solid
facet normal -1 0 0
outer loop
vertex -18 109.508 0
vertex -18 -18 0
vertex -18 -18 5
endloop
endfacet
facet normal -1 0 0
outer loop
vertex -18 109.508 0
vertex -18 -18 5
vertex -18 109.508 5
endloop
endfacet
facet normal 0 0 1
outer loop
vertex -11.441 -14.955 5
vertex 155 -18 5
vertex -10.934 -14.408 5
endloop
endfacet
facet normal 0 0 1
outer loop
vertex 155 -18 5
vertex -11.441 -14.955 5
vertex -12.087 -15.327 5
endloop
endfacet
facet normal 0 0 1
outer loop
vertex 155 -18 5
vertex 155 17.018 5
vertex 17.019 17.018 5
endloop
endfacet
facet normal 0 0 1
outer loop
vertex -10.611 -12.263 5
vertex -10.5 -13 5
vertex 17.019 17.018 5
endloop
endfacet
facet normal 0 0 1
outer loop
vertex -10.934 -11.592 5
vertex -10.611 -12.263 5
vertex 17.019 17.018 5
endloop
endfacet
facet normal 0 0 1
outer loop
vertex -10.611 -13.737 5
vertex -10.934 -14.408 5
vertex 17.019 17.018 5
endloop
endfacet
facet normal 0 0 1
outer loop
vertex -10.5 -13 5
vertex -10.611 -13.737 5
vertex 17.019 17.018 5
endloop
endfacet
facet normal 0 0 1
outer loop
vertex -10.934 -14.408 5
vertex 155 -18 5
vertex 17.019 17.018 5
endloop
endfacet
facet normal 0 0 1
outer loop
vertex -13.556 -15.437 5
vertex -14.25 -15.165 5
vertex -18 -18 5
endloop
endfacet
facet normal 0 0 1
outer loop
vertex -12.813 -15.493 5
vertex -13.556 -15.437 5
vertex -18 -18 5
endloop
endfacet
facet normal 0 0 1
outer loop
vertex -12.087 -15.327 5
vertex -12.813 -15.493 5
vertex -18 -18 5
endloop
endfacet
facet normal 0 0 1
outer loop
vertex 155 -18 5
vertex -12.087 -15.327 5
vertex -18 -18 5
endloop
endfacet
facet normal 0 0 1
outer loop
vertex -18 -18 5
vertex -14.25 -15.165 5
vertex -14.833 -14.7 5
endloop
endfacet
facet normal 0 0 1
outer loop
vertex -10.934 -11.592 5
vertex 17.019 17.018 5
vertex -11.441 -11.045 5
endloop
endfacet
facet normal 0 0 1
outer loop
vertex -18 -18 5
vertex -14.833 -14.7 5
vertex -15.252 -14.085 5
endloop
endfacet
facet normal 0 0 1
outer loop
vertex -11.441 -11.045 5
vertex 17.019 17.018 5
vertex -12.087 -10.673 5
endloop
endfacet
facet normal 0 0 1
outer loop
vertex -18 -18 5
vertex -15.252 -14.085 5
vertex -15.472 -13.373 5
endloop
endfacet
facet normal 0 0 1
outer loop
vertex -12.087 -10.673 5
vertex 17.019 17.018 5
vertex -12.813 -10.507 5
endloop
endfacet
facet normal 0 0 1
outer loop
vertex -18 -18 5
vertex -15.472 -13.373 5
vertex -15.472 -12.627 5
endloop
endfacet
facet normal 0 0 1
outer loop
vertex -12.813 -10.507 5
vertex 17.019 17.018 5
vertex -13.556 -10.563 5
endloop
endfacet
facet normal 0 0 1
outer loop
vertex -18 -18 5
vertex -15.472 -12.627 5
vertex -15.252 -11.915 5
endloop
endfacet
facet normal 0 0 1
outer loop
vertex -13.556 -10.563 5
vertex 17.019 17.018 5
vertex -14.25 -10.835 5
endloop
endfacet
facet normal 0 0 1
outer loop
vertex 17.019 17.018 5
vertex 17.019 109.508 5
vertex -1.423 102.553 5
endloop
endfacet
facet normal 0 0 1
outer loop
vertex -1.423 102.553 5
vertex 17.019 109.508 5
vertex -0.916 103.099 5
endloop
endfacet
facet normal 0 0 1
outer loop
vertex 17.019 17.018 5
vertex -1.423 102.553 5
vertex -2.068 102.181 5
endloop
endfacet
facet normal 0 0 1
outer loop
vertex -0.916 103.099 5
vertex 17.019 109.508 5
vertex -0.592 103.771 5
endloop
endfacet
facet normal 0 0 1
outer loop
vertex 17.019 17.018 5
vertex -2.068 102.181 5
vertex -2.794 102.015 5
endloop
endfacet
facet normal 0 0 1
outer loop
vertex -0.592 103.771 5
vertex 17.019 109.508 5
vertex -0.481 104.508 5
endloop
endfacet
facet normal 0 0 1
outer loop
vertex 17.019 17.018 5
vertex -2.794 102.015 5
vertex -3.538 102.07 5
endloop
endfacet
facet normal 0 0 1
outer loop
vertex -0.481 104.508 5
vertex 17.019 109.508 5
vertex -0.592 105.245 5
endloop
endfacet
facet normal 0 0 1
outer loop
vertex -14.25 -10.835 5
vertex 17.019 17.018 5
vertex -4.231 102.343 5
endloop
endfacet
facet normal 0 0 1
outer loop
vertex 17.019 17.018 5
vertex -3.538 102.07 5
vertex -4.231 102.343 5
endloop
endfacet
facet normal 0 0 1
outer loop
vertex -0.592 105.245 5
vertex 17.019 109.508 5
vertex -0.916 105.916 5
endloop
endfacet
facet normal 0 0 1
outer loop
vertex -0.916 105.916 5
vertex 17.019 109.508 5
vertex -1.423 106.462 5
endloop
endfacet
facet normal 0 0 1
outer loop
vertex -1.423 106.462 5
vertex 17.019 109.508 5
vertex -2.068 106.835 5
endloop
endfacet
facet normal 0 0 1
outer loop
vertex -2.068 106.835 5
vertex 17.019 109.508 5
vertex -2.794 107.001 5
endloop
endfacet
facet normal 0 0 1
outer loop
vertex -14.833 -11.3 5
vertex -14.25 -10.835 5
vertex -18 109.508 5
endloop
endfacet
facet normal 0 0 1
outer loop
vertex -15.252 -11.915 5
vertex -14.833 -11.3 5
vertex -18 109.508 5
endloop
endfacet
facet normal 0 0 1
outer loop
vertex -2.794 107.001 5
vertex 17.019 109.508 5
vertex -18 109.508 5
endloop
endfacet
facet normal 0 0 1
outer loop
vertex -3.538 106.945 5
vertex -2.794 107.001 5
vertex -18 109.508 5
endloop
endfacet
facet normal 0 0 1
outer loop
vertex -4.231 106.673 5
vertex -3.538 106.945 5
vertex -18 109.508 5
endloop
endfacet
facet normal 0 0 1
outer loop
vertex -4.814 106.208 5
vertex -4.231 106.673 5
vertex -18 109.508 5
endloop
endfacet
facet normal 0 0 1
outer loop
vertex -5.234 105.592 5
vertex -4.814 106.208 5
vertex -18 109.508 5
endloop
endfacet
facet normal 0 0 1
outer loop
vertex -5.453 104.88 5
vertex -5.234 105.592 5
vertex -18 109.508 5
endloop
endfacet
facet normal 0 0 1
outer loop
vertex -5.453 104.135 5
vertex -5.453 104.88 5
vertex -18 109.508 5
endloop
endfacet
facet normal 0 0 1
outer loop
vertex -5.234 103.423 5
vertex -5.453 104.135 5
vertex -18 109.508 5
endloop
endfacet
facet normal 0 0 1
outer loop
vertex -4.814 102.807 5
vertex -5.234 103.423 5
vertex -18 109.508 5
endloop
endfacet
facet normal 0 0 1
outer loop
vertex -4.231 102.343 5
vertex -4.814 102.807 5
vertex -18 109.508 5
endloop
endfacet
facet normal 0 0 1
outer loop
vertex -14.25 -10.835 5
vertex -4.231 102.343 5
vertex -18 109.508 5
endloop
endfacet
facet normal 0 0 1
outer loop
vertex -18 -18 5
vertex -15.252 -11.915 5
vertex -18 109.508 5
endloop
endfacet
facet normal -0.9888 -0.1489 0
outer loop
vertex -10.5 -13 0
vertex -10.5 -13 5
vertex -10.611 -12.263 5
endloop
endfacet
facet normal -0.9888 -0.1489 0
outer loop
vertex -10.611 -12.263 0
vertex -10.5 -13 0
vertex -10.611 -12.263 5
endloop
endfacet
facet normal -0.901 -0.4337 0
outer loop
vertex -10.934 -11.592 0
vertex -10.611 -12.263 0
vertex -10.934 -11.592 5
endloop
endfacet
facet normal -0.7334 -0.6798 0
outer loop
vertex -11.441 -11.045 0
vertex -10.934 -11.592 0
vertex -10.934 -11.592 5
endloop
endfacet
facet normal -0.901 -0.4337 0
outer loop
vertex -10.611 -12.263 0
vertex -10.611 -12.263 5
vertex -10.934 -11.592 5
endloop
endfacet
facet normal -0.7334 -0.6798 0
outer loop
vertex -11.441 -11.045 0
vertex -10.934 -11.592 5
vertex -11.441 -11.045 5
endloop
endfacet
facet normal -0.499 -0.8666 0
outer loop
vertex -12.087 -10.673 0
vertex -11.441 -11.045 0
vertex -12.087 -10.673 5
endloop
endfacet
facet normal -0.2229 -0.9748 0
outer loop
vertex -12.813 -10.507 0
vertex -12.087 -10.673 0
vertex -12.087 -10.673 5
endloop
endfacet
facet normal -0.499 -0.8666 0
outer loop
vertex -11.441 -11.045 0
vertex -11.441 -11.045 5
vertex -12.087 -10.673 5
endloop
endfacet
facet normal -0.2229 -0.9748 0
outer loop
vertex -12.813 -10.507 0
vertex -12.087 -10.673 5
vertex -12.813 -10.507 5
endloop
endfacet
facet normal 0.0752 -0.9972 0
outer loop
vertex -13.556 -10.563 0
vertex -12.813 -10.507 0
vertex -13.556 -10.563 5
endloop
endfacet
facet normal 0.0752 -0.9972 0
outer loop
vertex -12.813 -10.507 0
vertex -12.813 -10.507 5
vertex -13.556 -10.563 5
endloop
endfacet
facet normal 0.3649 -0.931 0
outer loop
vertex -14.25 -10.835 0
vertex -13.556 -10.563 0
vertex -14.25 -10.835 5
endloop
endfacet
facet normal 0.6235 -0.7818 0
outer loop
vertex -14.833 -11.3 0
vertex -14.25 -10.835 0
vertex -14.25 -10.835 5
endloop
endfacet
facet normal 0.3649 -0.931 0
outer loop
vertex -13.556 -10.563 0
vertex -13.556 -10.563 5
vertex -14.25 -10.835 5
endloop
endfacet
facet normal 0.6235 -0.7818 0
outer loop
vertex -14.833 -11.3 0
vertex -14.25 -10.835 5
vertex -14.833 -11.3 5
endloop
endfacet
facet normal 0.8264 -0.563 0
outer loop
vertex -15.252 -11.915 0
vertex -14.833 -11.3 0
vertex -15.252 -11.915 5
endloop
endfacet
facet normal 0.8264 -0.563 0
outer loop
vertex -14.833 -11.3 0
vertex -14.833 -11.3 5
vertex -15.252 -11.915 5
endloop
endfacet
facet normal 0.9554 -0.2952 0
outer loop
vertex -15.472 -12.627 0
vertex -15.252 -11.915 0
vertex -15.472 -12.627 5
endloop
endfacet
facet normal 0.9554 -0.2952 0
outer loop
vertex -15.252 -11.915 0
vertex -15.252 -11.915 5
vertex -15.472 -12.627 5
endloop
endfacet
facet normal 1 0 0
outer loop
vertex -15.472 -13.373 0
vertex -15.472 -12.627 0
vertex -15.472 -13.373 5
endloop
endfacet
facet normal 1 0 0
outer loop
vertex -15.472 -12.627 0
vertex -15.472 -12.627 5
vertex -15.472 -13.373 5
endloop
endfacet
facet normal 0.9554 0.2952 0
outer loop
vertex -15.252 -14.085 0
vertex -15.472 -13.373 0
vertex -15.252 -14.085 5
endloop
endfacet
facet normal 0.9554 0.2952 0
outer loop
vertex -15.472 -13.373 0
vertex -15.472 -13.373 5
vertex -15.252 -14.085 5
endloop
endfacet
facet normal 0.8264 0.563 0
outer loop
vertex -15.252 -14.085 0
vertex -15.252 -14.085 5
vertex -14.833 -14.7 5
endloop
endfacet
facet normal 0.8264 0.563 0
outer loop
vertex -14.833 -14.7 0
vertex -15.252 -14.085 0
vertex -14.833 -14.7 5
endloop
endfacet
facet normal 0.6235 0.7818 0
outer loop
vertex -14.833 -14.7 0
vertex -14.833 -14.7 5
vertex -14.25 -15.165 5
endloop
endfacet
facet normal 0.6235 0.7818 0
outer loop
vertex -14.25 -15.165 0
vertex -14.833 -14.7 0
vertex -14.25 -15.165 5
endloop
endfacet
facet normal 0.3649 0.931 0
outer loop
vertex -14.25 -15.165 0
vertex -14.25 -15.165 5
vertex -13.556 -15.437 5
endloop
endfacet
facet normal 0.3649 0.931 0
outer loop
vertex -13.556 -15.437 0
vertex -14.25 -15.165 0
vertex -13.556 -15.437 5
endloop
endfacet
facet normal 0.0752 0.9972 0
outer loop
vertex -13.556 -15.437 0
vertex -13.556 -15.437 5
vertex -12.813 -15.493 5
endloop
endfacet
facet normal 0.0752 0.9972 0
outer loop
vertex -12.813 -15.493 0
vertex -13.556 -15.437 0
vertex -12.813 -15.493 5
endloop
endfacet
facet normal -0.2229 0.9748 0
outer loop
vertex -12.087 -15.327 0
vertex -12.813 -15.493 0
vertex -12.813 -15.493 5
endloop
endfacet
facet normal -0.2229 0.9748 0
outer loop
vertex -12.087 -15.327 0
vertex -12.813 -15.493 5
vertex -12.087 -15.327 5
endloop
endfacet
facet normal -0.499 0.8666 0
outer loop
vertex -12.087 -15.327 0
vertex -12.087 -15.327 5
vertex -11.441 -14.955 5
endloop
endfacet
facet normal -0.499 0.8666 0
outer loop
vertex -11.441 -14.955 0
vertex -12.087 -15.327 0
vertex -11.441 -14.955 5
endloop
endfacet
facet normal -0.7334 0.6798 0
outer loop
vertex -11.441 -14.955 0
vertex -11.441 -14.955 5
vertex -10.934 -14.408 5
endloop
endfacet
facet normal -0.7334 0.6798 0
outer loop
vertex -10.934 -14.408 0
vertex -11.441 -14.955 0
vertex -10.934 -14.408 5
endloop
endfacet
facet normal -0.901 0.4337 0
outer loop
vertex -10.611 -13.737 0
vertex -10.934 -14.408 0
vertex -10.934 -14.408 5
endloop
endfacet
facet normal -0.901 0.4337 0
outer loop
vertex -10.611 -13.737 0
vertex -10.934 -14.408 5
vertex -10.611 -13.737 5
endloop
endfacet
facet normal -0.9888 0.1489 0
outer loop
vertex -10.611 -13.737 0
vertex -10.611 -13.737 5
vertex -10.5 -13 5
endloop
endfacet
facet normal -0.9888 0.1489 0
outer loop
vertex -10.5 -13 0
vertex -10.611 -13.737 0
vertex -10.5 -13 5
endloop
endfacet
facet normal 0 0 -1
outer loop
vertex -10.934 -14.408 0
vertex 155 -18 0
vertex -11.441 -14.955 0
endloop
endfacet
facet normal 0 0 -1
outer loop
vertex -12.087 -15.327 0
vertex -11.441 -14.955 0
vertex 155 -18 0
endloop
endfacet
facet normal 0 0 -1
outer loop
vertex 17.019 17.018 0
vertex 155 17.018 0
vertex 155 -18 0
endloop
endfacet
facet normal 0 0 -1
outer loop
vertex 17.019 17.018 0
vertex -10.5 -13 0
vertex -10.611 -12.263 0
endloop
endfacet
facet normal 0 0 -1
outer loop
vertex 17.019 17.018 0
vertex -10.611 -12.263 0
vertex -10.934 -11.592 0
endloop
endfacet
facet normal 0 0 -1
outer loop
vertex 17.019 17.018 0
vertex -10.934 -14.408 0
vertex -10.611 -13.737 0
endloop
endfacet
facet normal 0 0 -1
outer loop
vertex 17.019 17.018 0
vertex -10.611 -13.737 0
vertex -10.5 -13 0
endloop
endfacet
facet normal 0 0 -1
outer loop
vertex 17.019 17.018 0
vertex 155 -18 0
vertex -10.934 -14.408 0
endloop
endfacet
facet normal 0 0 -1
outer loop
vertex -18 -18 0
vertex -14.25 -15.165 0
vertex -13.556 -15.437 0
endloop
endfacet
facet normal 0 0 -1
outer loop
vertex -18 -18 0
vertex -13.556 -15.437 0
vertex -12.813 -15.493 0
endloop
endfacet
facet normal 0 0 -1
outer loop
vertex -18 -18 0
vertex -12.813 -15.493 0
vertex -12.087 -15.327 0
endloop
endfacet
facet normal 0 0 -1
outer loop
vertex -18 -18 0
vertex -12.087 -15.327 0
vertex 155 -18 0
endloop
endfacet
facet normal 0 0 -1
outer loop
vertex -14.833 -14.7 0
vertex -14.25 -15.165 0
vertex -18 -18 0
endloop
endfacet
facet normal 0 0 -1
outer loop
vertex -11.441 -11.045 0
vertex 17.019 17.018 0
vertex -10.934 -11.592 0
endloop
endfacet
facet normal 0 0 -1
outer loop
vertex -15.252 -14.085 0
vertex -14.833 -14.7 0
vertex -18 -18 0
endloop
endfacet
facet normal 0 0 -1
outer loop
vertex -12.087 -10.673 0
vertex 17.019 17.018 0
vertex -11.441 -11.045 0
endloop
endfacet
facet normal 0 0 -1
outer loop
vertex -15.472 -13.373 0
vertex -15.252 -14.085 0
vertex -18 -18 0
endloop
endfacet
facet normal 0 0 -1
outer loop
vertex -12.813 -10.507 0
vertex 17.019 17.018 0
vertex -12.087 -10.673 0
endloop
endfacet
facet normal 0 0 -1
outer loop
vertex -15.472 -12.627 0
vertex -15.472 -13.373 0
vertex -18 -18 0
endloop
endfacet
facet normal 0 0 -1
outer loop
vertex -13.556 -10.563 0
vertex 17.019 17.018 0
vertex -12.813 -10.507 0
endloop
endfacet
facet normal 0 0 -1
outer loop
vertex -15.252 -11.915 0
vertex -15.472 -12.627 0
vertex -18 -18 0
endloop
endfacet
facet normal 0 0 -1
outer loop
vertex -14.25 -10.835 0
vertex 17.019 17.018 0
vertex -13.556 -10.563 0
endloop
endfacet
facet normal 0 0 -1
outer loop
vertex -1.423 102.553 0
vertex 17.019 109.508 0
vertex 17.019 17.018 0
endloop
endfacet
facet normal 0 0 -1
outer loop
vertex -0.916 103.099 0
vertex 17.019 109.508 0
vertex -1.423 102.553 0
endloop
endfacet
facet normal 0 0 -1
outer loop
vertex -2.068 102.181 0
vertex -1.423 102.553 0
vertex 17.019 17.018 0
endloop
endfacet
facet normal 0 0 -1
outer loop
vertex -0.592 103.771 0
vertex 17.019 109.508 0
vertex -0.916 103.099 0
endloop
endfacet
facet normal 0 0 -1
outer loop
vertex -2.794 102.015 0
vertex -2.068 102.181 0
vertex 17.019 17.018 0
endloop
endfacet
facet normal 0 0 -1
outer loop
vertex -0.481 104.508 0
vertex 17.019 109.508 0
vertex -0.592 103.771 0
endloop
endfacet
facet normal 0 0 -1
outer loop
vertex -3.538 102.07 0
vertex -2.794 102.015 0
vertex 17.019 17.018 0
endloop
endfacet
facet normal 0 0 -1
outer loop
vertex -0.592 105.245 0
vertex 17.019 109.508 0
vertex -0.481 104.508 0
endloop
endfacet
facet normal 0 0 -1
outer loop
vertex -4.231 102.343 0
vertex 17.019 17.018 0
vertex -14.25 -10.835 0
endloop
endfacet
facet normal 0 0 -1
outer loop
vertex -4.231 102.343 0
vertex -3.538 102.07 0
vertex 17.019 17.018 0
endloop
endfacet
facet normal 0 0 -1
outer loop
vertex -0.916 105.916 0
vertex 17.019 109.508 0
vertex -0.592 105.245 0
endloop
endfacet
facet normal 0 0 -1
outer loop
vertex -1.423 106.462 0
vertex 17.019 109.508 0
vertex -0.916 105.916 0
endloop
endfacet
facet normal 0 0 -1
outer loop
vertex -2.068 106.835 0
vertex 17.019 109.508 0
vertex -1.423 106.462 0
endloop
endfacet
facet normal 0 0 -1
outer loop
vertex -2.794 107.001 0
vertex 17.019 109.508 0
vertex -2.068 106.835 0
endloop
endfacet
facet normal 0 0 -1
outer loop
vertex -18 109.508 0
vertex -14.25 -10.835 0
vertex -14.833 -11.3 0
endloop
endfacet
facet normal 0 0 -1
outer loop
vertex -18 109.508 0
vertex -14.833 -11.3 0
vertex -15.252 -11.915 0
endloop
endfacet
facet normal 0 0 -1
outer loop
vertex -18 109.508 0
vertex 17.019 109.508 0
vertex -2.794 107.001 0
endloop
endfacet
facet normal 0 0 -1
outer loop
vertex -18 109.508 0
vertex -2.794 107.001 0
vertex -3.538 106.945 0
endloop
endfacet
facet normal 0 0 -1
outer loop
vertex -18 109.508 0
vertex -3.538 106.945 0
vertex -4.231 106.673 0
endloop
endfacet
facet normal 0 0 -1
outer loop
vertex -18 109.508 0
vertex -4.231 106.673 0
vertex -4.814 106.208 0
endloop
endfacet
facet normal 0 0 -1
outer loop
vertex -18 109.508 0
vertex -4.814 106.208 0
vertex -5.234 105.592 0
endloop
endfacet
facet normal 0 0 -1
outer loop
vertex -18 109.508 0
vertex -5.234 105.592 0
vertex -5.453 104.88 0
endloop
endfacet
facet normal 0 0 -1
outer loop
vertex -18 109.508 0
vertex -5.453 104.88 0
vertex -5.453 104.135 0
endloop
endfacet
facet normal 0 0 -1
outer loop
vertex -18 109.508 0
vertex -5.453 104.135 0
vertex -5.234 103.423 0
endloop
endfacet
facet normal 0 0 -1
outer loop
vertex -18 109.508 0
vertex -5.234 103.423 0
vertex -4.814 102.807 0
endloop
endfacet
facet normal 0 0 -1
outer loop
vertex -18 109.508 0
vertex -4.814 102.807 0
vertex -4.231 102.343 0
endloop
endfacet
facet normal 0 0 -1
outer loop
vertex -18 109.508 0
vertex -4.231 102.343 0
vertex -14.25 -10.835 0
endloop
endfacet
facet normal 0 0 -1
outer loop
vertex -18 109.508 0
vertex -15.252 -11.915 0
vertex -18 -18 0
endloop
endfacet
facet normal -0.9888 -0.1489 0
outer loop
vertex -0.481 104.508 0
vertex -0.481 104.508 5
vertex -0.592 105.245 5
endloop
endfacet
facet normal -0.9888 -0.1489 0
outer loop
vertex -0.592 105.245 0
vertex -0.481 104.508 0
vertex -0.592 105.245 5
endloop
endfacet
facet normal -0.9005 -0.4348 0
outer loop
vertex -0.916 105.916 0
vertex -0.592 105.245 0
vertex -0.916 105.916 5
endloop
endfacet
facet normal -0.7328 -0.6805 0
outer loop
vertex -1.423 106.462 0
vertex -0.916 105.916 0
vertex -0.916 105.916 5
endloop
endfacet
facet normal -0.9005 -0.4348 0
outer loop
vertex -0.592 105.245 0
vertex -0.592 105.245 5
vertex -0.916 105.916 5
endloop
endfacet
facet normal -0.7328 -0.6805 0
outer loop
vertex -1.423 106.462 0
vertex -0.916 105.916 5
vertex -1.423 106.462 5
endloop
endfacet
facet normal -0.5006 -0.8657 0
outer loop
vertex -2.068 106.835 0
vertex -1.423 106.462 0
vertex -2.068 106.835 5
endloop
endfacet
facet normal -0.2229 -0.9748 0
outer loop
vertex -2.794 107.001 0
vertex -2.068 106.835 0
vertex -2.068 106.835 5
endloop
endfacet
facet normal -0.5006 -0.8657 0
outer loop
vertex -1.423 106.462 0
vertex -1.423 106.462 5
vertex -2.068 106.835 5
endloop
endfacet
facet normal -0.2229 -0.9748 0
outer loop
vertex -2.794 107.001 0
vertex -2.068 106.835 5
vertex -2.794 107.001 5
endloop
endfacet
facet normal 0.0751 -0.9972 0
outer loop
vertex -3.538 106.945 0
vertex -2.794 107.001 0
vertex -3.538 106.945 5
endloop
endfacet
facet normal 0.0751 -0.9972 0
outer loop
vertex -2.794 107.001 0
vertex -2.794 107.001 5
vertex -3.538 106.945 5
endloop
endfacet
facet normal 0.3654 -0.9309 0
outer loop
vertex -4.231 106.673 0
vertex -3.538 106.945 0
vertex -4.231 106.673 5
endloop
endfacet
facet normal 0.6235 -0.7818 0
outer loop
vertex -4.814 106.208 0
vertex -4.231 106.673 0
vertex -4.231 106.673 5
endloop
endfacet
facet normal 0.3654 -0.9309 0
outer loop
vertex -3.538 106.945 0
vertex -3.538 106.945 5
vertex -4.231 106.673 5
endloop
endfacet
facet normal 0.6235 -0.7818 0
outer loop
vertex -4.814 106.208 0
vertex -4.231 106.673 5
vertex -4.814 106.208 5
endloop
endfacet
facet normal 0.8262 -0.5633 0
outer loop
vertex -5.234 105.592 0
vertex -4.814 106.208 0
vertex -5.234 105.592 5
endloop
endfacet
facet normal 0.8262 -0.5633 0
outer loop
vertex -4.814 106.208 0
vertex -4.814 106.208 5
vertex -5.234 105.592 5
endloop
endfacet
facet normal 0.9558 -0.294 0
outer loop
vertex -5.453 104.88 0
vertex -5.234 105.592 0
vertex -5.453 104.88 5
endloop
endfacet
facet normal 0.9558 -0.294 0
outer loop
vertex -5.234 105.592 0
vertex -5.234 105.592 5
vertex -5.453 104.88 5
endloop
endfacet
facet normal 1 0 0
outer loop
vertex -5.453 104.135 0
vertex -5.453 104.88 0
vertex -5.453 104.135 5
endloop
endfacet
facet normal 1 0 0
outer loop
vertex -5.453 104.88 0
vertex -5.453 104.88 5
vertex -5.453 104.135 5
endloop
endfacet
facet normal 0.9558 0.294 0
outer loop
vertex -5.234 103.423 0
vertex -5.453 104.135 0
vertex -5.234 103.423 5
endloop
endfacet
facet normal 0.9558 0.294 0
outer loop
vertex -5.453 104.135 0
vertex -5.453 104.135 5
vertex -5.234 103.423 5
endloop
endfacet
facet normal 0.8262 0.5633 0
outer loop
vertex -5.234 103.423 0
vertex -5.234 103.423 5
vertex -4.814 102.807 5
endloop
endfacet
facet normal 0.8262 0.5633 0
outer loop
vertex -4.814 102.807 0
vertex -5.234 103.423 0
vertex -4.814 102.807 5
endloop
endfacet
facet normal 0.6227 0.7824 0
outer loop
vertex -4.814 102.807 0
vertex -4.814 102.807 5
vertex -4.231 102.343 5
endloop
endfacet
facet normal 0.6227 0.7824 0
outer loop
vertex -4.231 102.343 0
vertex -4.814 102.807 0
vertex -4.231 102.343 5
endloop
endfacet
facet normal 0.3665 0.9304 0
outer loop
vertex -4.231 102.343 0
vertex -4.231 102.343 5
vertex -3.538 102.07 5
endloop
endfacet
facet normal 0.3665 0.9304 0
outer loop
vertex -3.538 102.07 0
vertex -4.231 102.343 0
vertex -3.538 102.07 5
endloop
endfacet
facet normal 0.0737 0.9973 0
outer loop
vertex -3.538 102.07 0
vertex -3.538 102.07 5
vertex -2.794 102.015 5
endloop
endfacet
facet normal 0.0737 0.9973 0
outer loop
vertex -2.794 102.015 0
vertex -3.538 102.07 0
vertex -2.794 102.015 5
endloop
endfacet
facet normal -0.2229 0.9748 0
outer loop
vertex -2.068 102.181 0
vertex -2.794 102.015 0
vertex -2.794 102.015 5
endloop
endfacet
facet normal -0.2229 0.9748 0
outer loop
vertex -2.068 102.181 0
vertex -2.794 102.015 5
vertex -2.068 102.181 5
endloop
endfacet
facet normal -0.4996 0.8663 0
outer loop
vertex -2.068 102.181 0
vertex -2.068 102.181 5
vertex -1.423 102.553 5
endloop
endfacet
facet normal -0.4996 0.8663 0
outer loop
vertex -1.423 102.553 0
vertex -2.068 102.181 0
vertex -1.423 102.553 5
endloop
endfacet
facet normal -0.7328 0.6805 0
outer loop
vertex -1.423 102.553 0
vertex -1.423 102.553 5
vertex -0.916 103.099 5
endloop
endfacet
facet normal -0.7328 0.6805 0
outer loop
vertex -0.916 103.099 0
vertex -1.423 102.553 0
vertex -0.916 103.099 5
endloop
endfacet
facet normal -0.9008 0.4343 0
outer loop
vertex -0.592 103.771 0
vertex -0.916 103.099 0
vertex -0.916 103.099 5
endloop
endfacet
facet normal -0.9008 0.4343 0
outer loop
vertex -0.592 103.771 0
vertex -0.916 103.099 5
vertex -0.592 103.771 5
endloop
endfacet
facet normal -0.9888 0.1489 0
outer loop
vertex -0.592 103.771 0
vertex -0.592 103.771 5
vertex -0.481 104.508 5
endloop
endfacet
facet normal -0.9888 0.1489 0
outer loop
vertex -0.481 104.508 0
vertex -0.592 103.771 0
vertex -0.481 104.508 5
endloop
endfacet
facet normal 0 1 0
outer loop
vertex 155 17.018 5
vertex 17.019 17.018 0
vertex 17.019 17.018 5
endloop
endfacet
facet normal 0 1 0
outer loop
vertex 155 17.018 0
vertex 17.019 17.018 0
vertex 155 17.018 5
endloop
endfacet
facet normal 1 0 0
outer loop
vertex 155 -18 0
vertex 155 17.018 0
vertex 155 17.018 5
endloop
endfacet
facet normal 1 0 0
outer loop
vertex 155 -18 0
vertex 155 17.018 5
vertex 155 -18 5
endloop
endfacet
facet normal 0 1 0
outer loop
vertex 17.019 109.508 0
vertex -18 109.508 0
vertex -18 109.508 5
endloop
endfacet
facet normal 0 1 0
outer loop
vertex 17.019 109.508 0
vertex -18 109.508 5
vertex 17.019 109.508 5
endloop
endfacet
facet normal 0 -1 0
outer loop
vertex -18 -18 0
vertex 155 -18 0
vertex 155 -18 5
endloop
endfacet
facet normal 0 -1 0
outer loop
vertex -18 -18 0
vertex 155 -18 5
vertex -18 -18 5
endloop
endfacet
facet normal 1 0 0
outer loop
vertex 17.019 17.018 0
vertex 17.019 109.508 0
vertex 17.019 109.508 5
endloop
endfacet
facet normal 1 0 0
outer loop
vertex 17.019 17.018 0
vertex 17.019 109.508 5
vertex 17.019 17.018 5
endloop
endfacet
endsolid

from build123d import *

# Parameters (mm, degrees)
BOSS_EXTRUDE1_DEPTH = 5
SKETCH3_R           = 2.5
CUT_EXTRUDE1_DEPTH  = 6


with BuildPart() as part:
    # Sketch2 → Boss-Extrude1 (new body)
    with BuildSketch(Plane.XY):
        Polygon((-18.000000008, 109.507702779), (17.018717612, 109.507702779), (17.018717612, 17.017935082), (155, 17.017935082), (155, -18), (-18.000000008, -18), align=None)
    extrude(amount=BOSS_EXTRUDE1_DEPTH)

    # Sketch3 → Cut-Extrude1 (cut, through all)
    with BuildSketch(Plane.XY.offset(5)):
        with Locations((-13.000000008, -13)):
            Circle(SKETCH3_R)
        with Locations((-2.981282388, 104.507702779)):
            Circle(SKETCH3_R)
    extrude(amount=-CUT_EXTRUDE1_DEPTH, mode=Mode.SUBTRACT)


solid = part.part
